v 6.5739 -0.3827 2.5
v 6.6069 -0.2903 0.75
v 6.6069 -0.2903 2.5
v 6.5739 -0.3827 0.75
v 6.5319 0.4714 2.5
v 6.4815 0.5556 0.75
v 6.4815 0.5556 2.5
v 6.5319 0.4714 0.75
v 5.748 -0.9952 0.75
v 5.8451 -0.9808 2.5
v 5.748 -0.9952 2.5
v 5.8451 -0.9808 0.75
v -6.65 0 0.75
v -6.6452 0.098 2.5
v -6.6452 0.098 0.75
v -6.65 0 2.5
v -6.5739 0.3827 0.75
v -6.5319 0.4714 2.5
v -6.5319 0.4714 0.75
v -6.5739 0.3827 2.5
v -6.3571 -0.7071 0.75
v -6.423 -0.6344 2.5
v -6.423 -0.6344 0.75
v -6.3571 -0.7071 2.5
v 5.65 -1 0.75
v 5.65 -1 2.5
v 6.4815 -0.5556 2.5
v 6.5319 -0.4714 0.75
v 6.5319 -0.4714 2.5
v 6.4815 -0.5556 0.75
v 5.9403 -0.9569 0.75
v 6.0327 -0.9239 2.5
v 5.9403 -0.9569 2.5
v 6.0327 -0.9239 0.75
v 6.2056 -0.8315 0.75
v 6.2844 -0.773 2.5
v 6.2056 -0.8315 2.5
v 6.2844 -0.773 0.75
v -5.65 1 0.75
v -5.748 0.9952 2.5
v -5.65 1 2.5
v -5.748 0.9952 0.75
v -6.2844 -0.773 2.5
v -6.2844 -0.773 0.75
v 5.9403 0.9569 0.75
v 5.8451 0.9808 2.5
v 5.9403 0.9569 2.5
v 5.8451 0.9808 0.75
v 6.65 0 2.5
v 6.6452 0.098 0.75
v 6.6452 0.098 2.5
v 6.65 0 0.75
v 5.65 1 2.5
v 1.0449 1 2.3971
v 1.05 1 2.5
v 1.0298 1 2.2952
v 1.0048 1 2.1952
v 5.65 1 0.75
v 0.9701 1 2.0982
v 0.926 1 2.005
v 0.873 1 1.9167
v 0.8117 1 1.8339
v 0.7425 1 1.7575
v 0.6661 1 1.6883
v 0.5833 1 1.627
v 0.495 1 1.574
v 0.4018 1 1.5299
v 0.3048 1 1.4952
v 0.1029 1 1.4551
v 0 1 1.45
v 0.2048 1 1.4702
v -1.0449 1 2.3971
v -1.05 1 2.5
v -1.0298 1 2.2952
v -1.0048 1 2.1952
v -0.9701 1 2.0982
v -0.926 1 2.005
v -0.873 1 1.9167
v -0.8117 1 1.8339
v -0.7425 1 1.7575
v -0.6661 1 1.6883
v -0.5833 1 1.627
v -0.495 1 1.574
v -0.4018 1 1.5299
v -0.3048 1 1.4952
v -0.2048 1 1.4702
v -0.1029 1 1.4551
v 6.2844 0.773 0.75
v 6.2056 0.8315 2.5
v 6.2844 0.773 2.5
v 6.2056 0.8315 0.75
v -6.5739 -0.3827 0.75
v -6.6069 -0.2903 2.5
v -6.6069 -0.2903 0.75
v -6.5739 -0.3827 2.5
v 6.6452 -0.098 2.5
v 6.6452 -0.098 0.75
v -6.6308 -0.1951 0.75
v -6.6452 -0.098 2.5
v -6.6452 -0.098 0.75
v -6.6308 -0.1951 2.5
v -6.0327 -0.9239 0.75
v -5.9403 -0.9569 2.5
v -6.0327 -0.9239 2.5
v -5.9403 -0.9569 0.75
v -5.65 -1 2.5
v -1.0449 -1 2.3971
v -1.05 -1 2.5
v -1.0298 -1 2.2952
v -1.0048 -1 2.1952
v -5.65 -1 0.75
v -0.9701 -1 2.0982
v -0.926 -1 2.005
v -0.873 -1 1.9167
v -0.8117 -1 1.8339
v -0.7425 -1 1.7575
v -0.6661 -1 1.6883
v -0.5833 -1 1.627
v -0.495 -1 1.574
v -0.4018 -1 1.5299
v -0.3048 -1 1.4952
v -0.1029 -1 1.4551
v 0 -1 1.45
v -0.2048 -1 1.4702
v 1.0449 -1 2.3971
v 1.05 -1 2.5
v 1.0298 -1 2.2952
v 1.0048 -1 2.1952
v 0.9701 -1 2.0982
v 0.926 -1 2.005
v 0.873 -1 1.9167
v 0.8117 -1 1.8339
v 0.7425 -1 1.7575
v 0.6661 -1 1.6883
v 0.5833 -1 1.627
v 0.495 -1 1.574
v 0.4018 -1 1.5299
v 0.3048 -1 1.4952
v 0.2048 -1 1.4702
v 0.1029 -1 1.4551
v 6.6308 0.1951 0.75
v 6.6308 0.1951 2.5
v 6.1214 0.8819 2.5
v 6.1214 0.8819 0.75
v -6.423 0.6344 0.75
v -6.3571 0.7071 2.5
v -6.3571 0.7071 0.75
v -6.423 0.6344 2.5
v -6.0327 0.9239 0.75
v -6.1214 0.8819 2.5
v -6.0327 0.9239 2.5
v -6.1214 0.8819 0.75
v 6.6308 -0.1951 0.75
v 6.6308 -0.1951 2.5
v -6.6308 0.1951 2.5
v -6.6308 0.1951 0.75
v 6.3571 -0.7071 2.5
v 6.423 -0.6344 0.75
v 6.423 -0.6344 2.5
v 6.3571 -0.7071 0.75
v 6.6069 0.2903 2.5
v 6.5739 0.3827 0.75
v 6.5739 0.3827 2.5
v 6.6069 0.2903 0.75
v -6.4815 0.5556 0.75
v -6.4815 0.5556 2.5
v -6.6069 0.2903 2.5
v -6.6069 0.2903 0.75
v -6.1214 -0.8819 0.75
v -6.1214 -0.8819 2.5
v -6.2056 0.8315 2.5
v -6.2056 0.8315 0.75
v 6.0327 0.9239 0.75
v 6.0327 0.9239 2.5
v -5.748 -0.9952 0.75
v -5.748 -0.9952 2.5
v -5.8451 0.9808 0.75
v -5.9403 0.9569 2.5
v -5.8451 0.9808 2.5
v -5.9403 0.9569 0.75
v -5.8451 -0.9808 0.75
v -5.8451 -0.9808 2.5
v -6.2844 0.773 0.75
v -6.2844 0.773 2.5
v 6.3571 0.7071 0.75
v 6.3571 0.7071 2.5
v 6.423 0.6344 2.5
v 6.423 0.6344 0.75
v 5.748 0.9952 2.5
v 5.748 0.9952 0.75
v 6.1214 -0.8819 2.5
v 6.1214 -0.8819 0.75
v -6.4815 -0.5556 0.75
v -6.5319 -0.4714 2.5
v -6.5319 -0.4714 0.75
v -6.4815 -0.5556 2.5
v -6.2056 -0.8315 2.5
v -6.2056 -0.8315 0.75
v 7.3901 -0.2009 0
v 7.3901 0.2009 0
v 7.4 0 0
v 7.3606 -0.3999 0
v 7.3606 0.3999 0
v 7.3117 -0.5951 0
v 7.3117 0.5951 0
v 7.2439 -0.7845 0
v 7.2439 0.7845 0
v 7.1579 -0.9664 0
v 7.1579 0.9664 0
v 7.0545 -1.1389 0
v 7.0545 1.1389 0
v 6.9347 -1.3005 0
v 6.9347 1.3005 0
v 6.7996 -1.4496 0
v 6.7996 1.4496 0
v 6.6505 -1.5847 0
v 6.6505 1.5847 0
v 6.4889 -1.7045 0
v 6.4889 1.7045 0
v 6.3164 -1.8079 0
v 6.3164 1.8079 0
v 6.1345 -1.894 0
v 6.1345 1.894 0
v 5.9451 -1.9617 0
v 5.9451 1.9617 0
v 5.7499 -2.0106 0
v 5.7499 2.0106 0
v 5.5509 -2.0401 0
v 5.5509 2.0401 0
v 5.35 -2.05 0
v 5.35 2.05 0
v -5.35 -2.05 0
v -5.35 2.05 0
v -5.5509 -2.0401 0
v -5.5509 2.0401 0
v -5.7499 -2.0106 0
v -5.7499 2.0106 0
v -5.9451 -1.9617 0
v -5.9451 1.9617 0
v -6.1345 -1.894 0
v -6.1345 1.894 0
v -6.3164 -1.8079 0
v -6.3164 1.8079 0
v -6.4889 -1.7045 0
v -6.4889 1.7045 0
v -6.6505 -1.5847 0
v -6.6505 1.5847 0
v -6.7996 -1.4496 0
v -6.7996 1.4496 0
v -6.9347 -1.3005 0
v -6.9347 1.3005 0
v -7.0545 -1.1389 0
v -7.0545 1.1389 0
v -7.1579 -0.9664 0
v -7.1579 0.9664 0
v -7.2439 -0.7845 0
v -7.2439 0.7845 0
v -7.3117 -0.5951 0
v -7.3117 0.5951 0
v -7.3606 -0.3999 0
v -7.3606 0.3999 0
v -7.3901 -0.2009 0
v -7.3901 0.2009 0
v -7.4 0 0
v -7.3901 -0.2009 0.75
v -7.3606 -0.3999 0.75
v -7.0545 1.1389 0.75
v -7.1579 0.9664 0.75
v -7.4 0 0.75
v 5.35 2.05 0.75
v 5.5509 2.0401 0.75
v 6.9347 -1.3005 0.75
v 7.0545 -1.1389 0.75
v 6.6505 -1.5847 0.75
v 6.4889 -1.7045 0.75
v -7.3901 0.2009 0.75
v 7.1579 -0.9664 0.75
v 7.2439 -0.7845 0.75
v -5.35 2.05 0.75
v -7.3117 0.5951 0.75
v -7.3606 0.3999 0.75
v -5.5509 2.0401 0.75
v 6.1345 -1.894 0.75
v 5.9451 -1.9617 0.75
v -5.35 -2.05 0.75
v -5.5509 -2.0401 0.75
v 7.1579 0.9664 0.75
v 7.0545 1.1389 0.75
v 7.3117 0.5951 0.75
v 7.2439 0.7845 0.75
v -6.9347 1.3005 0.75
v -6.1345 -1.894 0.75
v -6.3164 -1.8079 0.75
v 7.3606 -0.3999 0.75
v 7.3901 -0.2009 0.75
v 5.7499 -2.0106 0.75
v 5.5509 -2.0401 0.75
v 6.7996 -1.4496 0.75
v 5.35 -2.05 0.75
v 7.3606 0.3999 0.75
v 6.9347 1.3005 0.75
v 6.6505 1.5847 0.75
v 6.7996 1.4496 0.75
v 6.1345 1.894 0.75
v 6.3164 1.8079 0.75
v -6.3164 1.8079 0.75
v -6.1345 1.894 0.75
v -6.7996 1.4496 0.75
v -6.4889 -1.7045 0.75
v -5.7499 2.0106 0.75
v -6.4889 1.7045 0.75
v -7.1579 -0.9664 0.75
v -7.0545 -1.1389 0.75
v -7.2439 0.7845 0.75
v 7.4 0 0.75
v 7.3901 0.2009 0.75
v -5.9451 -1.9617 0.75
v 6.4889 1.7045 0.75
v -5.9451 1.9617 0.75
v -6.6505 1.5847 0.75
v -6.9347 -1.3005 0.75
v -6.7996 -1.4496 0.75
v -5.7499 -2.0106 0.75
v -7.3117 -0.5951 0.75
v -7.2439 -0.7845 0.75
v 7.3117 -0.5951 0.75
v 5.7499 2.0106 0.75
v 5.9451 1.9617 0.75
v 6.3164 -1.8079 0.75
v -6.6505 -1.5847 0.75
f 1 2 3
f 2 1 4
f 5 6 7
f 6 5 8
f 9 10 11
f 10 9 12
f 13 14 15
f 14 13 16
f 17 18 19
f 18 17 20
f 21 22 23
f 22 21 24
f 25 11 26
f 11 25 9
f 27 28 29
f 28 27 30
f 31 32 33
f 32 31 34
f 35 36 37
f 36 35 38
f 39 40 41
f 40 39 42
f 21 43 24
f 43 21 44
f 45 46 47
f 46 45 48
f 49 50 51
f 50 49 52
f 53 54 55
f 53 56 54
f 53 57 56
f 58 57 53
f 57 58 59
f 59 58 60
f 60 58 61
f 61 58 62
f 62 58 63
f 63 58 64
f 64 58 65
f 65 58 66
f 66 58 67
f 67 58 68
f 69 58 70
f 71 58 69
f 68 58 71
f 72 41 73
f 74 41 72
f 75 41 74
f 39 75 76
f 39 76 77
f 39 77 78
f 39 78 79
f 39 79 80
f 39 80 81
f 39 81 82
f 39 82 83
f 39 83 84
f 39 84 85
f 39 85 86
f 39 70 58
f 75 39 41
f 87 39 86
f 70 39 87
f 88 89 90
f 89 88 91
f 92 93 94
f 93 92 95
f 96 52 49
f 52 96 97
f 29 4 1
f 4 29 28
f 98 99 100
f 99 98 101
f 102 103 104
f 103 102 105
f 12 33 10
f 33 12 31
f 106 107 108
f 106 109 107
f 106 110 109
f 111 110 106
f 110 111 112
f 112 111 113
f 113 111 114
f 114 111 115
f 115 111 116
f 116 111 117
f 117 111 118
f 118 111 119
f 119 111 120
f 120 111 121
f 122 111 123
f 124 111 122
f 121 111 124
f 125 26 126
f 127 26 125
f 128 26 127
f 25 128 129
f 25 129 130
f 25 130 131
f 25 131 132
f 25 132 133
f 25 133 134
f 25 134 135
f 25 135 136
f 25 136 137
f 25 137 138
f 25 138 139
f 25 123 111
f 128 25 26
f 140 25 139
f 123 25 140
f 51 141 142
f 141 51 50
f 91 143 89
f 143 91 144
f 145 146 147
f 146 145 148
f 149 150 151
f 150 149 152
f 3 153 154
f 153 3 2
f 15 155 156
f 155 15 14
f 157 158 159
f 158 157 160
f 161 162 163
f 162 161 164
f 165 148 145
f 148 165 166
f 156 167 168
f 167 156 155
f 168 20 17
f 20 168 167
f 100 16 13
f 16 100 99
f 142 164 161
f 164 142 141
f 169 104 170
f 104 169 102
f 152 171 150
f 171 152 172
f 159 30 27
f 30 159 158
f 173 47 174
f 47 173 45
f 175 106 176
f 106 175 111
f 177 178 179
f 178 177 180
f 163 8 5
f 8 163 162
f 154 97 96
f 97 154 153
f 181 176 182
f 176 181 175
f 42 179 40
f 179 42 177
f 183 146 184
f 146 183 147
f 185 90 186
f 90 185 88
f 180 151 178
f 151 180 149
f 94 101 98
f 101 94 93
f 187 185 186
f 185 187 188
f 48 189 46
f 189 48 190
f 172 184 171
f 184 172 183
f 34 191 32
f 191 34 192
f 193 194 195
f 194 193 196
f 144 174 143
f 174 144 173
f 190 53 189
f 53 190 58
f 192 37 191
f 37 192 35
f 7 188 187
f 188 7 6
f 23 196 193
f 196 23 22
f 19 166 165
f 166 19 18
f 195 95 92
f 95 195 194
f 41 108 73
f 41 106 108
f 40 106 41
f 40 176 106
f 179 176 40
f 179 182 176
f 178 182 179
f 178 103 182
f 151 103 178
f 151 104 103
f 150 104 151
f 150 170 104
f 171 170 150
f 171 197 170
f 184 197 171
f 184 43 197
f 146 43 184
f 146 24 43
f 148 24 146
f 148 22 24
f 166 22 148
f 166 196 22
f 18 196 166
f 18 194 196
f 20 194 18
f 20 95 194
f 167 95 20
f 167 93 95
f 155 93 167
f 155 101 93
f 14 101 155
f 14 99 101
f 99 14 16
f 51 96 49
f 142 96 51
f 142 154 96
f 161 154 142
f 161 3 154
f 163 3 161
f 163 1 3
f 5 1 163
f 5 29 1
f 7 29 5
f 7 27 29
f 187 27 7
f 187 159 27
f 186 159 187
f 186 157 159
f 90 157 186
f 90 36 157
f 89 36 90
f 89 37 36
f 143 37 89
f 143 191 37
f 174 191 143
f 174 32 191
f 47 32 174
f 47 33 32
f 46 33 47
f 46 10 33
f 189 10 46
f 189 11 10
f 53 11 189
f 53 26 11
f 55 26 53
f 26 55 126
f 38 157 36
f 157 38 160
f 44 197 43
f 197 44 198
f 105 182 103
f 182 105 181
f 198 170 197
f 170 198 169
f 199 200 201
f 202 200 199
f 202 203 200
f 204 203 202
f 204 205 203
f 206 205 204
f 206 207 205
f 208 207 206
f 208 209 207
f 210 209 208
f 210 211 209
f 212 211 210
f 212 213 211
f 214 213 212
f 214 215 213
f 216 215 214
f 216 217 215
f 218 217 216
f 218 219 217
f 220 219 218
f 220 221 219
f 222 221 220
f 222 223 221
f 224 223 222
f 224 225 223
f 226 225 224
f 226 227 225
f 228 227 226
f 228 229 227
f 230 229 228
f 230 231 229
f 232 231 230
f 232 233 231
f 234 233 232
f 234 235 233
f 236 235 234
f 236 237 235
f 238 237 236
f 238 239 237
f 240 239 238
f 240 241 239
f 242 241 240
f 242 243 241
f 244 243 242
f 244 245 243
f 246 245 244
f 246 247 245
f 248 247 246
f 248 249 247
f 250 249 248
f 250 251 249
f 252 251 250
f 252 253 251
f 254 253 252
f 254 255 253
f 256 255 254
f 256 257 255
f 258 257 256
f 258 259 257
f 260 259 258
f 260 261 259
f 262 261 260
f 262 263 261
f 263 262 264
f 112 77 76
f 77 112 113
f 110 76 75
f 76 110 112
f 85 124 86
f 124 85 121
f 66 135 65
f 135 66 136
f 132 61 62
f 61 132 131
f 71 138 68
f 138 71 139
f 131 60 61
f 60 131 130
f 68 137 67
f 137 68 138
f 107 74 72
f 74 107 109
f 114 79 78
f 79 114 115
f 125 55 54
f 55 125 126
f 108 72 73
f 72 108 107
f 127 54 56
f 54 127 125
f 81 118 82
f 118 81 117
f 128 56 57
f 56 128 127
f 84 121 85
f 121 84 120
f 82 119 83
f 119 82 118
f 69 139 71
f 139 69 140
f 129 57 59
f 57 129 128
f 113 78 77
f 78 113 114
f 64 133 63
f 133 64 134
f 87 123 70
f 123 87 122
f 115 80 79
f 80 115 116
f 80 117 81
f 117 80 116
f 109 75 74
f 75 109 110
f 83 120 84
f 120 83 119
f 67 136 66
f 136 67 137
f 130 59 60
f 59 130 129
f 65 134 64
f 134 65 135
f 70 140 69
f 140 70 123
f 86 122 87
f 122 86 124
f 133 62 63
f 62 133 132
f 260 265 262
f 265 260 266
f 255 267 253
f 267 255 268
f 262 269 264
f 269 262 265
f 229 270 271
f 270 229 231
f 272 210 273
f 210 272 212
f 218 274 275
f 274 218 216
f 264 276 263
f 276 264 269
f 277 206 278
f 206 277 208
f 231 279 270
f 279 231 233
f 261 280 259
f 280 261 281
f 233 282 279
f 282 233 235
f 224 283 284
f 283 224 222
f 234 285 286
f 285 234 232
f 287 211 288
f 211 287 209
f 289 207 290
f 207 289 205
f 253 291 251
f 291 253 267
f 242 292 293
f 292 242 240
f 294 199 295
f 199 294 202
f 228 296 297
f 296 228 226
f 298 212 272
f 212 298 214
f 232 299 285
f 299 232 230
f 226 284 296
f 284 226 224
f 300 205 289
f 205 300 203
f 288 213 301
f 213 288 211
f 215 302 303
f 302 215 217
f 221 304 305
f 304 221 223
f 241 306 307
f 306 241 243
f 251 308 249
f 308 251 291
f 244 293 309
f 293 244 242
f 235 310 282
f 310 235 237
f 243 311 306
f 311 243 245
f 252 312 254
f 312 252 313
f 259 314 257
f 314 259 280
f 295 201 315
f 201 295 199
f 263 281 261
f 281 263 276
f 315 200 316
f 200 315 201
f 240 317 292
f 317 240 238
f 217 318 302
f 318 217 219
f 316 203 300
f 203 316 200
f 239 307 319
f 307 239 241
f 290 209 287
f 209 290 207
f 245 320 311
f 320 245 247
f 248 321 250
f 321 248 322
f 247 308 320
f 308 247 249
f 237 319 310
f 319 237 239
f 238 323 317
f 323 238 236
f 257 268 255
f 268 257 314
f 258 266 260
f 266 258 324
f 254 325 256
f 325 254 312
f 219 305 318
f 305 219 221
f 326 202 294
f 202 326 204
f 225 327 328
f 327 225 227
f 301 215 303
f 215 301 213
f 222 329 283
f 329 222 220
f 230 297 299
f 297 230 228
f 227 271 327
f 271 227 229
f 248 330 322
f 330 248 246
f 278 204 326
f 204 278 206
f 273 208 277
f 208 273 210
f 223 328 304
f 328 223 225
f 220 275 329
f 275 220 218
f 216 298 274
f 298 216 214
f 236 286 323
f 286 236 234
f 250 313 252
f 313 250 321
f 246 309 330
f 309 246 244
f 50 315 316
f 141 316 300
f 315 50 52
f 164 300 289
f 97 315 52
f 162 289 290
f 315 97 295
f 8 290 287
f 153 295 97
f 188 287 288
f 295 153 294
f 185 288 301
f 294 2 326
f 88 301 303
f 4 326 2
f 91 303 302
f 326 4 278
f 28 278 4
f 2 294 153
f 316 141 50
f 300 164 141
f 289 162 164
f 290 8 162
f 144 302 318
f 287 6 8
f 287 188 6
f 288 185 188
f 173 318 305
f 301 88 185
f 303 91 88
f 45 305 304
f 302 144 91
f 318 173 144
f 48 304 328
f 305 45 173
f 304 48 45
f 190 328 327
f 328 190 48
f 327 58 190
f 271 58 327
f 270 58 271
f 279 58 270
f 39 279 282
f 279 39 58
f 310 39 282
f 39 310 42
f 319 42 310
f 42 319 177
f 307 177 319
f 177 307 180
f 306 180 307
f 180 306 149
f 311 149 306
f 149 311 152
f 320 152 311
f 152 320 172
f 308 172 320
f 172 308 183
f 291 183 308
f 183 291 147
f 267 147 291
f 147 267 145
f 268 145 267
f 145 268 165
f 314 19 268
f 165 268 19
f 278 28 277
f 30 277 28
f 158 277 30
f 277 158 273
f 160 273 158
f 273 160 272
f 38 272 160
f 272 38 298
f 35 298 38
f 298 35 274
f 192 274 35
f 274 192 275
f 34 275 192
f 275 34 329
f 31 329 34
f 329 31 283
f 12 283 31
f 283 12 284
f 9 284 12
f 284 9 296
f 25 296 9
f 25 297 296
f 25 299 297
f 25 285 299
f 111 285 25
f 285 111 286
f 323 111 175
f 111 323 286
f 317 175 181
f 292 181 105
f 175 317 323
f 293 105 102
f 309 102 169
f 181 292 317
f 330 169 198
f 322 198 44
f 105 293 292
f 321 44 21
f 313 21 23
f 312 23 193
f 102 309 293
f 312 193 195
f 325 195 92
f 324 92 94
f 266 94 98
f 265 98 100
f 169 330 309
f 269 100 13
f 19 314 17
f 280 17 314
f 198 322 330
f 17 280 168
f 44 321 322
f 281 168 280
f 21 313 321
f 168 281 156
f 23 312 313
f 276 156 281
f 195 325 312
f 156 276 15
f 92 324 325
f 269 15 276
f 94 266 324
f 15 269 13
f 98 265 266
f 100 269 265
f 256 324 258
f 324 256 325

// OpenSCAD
length = 14.8;
width = 4.1;
baseThickness = 0.75;
buttonWidth = 2;
buttonsAreaLength = 13.3;
buttonThickness = 1.75;

module dummy(){}
$fn = 64;

linear_extrude(height=baseThickness)
hull()
for (i=[-1,1]) {
    translate([i*(length/2-width/2),0])
    circle(d=width);
}

difference() {
linear_extrude(height=baseThickness+buttonThickness)
hull() 
for (i=[-1,1]) {
        translate([i*(buttonsAreaLength/2-buttonWidth/2),0]) circle(d=buttonWidth);
}
translate([0,0,baseThickness+buttonThickness])
rotate([90,0,0])
cylinder(r=buttonThickness*0.6,h=4*buttonWidth,center=true);
}
